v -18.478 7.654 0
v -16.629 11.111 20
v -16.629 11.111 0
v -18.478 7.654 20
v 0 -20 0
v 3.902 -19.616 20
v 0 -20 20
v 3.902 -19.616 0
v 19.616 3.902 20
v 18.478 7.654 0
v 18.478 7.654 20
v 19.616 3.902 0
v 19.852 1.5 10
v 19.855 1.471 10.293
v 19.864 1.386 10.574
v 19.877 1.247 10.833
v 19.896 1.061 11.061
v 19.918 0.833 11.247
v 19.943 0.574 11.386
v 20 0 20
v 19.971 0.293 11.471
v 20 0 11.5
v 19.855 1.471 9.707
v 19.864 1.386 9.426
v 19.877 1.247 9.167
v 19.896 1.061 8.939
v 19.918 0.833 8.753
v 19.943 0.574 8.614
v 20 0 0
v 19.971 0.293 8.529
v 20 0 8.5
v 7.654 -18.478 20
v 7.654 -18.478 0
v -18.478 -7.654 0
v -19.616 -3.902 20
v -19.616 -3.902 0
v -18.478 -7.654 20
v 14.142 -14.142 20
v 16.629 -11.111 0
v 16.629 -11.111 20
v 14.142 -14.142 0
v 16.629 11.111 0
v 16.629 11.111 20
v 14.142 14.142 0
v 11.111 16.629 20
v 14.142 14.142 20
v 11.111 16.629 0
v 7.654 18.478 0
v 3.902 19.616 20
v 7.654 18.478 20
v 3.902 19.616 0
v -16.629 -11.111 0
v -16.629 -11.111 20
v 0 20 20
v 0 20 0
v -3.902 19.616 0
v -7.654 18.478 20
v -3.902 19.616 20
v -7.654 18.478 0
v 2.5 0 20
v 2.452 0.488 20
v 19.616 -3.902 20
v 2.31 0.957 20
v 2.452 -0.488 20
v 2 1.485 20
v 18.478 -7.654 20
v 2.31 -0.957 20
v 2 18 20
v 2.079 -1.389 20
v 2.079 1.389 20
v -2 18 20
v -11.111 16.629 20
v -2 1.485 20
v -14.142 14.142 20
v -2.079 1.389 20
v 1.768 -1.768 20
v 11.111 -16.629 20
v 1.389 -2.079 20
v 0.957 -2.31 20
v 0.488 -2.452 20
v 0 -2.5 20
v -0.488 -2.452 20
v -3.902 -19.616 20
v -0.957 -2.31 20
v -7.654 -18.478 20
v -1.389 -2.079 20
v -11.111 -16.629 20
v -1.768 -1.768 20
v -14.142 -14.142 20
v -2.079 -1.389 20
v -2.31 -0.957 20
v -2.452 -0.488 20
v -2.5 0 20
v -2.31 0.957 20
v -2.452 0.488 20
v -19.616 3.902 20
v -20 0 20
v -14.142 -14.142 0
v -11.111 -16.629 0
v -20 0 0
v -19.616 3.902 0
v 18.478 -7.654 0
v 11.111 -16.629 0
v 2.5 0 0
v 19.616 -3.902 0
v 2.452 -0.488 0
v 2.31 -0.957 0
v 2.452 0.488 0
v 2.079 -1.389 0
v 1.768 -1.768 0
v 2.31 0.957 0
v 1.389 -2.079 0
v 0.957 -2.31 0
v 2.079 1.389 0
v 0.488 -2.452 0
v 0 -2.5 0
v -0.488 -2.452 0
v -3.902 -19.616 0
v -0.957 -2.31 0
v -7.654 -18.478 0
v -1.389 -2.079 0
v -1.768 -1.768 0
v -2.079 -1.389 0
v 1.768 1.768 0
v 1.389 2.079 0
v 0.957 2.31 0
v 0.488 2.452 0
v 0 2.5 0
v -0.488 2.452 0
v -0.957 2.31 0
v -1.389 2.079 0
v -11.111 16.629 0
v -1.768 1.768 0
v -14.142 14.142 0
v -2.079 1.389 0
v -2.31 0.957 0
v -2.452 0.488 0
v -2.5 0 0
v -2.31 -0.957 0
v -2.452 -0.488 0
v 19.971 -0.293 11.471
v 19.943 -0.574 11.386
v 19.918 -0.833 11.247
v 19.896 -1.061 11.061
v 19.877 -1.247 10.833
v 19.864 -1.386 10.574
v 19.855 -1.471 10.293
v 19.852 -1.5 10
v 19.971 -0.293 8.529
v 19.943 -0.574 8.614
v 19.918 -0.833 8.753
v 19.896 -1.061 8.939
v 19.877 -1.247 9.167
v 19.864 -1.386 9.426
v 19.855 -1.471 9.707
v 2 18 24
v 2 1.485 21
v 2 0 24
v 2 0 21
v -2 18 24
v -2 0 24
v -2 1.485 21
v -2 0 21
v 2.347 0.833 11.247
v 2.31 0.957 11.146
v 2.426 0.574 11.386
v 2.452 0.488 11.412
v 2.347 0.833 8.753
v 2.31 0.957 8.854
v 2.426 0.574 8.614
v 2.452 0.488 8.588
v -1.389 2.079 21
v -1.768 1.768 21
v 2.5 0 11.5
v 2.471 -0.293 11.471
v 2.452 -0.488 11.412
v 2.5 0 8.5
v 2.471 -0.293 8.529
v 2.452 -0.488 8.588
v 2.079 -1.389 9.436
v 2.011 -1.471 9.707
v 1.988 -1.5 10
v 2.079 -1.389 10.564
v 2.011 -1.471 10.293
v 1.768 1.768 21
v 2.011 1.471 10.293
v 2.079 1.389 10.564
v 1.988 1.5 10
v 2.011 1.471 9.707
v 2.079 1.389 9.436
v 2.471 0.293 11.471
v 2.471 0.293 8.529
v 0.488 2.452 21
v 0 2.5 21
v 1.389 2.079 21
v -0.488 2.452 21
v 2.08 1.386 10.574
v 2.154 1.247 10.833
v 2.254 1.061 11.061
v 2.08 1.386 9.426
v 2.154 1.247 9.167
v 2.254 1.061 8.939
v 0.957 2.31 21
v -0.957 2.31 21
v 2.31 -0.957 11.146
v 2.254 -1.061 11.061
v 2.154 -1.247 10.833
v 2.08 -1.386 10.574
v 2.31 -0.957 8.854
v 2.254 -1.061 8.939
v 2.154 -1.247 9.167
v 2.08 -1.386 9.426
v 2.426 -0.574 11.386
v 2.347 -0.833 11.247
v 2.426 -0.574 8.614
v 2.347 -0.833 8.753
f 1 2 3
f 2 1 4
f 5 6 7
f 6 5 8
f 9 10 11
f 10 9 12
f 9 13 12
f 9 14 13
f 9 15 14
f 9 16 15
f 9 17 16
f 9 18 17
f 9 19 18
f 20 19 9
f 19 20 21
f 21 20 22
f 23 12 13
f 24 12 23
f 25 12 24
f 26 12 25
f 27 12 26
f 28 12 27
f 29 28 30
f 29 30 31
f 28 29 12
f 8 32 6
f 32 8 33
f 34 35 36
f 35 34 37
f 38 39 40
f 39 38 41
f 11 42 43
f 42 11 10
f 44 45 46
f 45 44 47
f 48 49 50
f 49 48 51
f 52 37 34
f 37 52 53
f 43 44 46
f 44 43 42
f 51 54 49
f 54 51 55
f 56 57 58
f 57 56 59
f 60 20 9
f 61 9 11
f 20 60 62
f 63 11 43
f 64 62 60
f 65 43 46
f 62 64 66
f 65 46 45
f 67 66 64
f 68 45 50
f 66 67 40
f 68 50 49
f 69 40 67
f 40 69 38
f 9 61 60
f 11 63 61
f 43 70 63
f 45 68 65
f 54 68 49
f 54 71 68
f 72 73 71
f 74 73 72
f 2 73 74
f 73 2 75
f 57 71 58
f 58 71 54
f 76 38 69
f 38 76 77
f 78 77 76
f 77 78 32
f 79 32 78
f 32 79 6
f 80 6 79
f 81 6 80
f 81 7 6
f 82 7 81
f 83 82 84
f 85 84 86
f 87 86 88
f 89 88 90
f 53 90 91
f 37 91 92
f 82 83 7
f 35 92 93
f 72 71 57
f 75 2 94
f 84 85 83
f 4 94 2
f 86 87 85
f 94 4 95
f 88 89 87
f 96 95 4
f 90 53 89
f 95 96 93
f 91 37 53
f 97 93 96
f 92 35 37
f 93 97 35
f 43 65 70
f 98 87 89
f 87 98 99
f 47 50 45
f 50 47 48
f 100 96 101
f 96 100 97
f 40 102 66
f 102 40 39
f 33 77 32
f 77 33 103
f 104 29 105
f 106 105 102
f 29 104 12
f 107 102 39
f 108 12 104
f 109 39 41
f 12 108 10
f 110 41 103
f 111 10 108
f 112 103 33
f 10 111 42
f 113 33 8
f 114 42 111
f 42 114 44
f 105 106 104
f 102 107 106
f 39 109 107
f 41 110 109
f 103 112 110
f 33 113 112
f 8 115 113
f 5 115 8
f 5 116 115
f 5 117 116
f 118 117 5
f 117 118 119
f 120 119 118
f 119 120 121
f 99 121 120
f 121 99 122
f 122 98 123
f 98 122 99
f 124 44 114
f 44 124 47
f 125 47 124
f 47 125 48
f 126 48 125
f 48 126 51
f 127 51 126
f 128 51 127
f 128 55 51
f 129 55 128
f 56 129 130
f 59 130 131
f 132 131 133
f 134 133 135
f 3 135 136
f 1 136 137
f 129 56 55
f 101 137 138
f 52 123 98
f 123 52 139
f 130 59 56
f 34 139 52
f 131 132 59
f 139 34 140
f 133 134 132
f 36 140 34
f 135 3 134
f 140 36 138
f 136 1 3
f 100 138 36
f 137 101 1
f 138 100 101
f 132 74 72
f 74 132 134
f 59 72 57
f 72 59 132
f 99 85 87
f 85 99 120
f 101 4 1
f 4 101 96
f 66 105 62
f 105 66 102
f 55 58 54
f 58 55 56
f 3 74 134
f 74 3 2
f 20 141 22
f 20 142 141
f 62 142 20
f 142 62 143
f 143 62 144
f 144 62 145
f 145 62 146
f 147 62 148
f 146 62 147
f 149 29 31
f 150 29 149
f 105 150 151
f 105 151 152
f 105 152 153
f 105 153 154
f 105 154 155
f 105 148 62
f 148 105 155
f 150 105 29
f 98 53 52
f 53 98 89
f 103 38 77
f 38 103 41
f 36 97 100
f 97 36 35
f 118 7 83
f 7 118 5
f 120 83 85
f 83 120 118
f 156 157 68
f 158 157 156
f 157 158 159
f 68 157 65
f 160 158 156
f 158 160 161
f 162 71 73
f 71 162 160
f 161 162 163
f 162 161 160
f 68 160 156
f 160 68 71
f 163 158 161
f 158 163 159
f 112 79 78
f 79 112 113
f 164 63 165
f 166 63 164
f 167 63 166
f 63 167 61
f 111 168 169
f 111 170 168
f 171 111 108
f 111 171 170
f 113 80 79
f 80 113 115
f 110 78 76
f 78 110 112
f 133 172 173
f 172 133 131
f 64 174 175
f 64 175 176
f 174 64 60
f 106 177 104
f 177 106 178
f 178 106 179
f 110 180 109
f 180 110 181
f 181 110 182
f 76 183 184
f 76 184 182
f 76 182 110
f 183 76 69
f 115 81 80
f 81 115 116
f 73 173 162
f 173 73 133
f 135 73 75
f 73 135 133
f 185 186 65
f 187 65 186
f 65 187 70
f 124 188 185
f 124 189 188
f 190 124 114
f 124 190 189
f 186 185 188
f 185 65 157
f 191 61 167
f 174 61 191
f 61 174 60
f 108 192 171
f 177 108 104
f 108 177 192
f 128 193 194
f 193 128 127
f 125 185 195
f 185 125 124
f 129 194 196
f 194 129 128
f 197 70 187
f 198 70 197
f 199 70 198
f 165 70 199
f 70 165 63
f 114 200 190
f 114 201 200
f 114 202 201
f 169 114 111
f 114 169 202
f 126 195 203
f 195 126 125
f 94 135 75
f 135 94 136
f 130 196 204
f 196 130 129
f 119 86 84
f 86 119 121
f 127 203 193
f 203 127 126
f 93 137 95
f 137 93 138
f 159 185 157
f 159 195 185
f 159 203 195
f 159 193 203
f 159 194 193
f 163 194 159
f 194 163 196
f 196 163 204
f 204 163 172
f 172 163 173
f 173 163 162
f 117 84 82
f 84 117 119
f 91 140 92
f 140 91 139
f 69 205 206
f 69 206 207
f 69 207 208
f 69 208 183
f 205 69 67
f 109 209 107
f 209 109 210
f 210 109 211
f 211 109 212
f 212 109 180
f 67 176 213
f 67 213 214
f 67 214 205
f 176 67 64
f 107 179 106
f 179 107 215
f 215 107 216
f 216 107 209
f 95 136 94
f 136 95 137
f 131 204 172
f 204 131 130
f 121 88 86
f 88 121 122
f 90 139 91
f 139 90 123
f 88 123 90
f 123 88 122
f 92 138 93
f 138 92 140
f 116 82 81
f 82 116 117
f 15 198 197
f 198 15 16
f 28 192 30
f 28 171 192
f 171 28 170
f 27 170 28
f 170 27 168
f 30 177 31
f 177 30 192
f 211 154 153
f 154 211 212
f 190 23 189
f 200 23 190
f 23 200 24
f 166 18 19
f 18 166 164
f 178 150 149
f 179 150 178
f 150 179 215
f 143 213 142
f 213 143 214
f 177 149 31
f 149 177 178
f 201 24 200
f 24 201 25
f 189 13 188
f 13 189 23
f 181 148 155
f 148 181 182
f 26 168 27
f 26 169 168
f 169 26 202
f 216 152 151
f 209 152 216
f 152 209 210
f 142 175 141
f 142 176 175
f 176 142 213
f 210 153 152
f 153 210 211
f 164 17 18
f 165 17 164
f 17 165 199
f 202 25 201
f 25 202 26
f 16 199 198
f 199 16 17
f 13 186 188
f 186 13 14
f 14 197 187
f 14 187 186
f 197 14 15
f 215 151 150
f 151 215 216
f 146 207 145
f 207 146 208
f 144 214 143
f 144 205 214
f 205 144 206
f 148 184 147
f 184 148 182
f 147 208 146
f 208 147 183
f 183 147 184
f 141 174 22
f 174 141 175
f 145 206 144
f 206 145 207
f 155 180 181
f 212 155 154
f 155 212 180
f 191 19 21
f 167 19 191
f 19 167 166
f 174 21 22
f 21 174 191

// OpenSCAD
$fn = 32;

// ----------------------------------------------------------------------
// Control knob: pointer knob
// ----------------------------------------------------------------------

// --- parameters (mm) ---
rib_w = 4;                // pointer rib width
rib_h = 5;                // pointer rib height
knob_d = 40;              // knob body diameter
knob_h = 20;              // knob body height
bore_d = 5;               // shaft bore diameter
set_d = 3;                // set screw bore diameter

rib_poke = rib_h - 1;  // rib height above the top
total_h = knob_h + rib_h - 1;  // overall height

difference() {
  union() {
    cylinder(h = knob_h, d = knob_d);
    translate([-rib_w / 2, 0, knob_h - 1])
      cube([rib_w, knob_d / 2 - 2, rib_h]);
  }
  translate([0, 0, -1]) cylinder(h = knob_h + 2, d = bore_d);
  translate([-1, 0, knob_h / 2]) rotate([0, 90, 0])
    cylinder(h = knob_d / 2 + bore_d / 2 + 2, d = set_d);}
